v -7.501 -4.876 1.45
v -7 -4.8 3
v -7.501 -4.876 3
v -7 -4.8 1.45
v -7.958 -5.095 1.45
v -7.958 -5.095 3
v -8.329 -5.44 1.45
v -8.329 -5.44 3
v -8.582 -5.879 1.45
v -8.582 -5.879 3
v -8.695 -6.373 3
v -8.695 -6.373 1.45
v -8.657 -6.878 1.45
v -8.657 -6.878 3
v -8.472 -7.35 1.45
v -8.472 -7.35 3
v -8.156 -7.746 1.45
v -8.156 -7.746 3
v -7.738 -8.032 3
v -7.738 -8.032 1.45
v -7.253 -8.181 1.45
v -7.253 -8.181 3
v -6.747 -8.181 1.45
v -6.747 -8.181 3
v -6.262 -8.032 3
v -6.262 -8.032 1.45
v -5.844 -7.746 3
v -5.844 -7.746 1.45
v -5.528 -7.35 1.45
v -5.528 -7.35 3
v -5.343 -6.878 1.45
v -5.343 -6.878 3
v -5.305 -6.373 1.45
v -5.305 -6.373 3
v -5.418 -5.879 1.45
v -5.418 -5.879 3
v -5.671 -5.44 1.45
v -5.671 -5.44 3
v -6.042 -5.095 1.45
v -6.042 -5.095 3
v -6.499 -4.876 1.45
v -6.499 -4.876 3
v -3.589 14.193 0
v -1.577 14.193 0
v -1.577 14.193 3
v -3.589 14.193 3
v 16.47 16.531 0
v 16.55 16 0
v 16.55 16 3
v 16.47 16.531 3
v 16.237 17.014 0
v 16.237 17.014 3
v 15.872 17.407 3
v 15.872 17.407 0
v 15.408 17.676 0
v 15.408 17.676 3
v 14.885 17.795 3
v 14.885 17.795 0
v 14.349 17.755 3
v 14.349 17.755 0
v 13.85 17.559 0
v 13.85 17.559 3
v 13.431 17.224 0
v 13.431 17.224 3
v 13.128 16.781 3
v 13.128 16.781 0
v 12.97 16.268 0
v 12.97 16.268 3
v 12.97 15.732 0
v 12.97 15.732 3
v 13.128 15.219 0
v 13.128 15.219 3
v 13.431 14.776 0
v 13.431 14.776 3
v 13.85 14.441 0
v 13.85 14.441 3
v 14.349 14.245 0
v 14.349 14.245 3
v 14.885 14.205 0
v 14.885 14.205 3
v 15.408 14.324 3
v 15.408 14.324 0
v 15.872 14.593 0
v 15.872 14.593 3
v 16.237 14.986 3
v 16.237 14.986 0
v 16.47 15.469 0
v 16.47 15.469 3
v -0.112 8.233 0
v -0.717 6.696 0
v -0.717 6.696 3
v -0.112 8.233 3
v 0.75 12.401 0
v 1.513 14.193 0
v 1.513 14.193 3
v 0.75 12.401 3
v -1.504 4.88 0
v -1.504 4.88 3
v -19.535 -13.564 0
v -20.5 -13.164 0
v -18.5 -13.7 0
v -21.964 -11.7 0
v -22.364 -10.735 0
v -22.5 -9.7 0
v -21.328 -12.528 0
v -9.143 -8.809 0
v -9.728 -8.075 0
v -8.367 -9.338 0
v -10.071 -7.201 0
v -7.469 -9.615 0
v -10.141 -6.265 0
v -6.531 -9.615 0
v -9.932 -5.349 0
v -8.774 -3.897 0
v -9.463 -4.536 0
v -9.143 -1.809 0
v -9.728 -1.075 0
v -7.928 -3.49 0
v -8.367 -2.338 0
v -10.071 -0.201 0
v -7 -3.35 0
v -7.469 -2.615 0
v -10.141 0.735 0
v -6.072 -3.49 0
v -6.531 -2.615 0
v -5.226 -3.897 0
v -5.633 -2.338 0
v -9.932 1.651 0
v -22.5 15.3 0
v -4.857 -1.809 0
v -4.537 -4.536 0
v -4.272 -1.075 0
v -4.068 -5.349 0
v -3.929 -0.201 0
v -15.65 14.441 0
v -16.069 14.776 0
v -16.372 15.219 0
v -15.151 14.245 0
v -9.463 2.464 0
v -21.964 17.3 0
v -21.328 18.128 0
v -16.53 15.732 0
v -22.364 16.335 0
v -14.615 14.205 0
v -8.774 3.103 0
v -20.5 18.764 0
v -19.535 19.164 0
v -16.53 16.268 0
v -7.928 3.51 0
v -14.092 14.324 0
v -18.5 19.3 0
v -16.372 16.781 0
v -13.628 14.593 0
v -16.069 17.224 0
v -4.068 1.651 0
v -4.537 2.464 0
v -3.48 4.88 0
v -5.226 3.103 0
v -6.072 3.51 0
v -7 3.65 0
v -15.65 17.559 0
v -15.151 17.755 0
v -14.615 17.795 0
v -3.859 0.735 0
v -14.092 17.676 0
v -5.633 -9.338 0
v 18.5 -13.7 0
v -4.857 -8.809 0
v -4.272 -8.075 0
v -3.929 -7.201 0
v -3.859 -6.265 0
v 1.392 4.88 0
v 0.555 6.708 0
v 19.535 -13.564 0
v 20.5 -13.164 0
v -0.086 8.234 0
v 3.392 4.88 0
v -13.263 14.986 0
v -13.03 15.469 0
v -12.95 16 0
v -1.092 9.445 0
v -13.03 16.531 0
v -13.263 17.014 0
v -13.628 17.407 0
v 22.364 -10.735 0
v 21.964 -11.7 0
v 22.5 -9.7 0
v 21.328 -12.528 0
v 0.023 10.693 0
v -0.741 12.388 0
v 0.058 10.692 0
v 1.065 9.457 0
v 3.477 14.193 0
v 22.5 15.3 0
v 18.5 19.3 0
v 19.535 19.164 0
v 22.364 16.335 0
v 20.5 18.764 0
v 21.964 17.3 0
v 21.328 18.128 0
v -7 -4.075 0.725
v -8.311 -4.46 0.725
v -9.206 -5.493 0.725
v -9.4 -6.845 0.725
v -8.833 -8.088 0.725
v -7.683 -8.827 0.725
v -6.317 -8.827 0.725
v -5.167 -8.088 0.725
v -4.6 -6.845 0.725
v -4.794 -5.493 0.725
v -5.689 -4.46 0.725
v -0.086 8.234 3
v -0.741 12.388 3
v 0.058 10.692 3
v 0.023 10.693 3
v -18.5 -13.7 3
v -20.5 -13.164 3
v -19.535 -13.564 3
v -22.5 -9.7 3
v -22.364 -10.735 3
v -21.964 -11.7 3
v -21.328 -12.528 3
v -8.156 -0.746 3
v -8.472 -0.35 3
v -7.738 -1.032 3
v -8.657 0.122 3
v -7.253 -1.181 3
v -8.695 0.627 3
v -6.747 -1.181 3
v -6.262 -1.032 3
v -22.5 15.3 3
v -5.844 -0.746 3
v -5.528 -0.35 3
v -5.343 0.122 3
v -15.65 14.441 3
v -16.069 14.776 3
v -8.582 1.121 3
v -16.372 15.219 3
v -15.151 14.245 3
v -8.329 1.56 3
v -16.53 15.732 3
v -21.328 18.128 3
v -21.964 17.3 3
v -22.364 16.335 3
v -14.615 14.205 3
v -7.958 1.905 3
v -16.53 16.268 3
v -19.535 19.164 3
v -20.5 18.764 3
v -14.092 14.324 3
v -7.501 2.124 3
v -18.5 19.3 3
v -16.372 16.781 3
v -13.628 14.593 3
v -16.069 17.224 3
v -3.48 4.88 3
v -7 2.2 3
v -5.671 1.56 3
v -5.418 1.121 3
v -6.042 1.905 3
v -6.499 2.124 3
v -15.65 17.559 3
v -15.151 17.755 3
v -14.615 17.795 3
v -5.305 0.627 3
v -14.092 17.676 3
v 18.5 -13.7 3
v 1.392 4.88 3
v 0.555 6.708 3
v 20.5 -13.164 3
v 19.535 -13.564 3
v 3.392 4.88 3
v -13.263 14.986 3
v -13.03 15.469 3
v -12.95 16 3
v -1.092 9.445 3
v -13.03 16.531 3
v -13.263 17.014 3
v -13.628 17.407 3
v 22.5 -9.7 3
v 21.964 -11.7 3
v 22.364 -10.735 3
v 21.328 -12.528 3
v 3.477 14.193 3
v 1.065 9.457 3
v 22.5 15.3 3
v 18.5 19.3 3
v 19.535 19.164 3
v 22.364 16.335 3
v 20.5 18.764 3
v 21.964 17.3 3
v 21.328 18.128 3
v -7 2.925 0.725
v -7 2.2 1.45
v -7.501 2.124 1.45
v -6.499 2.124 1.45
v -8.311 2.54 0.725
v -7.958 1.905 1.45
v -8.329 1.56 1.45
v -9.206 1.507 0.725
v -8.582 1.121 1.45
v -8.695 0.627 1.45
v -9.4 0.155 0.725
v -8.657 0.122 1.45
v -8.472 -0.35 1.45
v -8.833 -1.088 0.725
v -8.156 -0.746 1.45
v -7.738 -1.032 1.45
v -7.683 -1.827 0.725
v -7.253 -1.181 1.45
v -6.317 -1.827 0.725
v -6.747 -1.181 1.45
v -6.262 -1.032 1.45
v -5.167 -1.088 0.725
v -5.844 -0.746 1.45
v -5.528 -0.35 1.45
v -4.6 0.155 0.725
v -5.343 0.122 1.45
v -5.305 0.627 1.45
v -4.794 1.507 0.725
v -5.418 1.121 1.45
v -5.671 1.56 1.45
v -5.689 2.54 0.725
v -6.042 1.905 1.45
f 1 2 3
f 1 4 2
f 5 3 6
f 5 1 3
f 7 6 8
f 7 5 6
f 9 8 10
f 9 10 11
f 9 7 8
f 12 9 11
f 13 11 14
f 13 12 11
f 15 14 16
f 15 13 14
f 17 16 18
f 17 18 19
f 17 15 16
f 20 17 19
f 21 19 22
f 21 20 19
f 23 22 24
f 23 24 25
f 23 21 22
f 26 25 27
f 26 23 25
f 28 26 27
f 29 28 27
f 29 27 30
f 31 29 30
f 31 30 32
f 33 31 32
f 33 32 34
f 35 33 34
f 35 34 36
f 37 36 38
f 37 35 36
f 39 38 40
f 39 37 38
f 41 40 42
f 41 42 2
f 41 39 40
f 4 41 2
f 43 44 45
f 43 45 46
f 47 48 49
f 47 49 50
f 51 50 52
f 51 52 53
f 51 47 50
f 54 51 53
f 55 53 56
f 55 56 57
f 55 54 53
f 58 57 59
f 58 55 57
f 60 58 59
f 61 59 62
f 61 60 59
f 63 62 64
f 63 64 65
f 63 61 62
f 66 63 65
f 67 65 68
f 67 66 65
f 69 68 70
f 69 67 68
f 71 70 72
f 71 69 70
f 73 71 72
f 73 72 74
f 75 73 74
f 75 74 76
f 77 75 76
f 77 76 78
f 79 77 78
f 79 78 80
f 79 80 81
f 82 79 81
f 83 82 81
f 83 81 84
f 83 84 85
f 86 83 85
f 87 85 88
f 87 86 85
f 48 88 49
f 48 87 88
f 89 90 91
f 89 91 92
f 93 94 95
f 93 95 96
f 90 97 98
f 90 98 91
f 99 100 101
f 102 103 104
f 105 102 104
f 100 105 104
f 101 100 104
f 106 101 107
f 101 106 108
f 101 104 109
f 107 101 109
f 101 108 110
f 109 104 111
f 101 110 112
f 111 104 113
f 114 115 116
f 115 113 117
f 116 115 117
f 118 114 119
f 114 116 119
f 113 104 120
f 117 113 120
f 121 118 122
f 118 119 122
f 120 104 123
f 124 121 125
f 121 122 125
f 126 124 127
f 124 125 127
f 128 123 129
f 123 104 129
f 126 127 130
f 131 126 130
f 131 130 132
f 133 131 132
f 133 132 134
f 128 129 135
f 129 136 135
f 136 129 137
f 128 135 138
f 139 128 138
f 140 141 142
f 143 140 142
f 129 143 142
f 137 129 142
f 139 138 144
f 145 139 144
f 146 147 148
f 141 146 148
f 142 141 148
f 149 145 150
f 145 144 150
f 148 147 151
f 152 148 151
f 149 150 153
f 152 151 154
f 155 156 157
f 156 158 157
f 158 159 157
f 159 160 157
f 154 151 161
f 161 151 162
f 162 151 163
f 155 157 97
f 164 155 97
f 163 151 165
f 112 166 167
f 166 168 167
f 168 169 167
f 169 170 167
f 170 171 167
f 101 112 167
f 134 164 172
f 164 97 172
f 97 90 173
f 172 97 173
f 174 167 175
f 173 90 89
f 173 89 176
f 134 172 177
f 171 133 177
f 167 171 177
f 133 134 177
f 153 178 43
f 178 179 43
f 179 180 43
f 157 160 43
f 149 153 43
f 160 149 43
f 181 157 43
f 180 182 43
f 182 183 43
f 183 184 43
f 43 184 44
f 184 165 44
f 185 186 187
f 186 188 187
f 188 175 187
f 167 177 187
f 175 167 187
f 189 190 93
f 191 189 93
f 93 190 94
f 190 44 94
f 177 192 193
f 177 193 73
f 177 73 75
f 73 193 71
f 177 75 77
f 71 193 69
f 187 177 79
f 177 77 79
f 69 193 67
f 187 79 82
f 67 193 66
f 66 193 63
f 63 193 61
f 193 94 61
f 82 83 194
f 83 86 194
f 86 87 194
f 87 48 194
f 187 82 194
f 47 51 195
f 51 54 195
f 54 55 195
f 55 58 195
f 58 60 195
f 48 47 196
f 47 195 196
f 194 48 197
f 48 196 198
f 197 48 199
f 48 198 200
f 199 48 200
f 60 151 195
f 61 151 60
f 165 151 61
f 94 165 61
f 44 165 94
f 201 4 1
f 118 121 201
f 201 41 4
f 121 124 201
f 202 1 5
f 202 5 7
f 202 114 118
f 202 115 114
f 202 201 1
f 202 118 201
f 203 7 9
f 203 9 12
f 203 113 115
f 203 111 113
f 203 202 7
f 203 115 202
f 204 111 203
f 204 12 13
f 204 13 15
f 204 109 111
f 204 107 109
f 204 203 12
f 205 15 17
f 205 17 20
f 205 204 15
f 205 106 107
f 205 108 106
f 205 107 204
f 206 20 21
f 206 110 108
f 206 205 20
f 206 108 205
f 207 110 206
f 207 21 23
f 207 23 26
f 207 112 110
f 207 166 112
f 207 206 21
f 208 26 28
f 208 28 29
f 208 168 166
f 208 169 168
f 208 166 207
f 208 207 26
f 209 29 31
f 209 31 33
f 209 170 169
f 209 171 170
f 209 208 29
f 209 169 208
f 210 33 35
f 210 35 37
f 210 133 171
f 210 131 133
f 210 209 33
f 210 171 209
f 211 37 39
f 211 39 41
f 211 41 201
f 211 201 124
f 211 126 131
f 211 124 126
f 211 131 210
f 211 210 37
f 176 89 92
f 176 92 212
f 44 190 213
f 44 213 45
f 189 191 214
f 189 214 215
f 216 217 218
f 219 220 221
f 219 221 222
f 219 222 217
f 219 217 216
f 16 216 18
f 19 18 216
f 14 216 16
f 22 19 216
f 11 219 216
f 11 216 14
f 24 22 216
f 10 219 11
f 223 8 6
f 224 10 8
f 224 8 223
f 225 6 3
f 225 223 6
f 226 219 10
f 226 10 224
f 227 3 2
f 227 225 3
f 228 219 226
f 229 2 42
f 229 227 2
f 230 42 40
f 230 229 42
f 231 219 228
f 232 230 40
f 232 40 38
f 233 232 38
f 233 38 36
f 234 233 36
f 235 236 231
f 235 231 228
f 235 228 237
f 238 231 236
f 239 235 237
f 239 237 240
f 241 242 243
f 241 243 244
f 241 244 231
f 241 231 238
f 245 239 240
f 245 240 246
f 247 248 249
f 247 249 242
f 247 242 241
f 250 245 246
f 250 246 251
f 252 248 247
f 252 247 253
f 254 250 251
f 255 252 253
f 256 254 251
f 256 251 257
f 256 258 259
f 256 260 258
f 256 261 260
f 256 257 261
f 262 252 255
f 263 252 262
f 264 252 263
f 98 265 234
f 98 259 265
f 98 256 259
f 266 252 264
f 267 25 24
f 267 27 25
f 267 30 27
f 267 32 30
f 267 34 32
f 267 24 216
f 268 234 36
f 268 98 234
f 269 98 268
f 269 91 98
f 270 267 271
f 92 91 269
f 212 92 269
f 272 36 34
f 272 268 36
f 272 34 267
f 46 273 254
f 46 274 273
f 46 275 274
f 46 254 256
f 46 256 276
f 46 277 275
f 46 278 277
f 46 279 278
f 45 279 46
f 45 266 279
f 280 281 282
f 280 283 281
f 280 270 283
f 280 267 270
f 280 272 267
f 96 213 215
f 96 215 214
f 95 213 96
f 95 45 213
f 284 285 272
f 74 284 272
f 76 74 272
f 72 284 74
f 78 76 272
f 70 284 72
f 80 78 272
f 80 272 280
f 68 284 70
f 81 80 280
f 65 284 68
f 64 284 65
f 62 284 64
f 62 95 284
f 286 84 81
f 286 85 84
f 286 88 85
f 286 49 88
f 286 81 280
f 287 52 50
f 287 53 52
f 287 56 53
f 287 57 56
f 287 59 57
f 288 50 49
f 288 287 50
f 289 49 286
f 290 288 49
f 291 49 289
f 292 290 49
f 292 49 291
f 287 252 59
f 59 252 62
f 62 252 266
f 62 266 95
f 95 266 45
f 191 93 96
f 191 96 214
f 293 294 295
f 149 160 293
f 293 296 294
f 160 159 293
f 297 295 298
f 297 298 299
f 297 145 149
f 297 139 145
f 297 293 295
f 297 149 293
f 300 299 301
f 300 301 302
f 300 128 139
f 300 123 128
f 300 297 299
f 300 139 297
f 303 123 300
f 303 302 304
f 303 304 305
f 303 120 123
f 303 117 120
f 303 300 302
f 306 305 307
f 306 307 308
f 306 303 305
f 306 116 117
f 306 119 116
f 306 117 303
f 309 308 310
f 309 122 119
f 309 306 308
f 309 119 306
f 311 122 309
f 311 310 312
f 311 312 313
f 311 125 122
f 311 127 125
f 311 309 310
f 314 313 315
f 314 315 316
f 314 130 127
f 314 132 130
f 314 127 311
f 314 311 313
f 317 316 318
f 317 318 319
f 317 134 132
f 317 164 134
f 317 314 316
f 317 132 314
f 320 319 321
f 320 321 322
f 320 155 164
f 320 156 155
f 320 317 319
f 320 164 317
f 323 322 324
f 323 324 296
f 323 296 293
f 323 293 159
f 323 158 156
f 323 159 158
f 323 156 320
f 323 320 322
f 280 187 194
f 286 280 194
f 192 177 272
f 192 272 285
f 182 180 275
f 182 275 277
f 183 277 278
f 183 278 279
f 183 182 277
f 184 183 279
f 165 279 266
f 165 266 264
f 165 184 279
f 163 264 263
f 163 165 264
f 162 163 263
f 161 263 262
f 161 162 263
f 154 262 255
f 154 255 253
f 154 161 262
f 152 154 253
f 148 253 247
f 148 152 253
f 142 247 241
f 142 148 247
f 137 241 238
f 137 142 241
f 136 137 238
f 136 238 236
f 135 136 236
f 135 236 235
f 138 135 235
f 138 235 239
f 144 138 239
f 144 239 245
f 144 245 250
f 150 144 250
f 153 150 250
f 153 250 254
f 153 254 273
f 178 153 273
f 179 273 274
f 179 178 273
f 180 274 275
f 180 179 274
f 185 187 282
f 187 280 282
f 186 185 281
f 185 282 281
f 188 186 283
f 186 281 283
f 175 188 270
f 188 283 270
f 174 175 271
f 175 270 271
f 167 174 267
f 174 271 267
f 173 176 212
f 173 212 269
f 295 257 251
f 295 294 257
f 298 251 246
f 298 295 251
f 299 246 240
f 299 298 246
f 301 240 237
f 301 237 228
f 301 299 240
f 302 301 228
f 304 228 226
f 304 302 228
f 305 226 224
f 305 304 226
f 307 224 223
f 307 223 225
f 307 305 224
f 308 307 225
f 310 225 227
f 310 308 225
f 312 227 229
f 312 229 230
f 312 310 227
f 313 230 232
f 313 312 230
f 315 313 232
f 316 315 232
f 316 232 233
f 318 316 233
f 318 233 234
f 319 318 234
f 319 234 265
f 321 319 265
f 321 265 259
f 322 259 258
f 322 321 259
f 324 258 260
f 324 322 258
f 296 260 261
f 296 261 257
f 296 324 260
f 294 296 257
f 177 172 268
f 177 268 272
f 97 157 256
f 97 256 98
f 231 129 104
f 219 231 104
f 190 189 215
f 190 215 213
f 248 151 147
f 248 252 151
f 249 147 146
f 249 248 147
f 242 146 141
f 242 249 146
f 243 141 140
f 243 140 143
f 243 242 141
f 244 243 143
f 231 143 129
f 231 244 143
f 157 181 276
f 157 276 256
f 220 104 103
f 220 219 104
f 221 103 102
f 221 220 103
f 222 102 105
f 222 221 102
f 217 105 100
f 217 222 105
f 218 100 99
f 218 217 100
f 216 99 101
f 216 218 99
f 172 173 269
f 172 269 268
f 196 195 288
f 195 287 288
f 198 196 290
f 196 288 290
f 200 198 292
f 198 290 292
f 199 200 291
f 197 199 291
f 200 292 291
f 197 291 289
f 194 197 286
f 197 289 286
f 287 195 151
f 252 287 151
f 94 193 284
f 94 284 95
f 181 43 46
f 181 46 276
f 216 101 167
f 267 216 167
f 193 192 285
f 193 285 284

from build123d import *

# Parameters (mm, degrees)
SKETCH1_R                                    = 1.8
BOSS_EXTRUDE1_DEPTH                          = 3
FILLET1_R                                    = 4
CSK_FOR_M3_COUNTERSUNK_FLAT_HEAD_SCR_2_COUNT = 2
CSK_FOR_M3_COUNTERSUNK_FLAT_HEAD_SCR_2_PITCH = 7


with BuildPart() as part:
    # Sketch1 → Boss-Extrude1 (new body)
    with BuildSketch(Plane.XY):
        Polygon((22.5, 19.3), (-22.5, 19.3), (-22.5, -9.7), (-22.5, -13.7), (22.5, -13.7), (22.5, -9.7), align=None)
        with Locations((14.75, 16)):
            Circle(SKETCH1_R, mode=Mode.SUBTRACT)
        with Locations((-14.75, 16)):
            Circle(SKETCH1_R, mode=Mode.SUBTRACT)
        with BuildLine():
            Line((-3.479994944, 4.879643035), (-1.504454613, 4.879643035))
            Line((-1.504454613, 4.879643035), (-0.716662457, 6.696078227))
            add(Edge.make_bspline(
                [(-0.716662457, 6.696078227), (-0.662988728, 6.823847603), (-0.558253832, 7.073167199), (-0.407159323, 7.448475347), (-0.260246479, 7.833509844), (-0.163053085, 8.096372908), (-0.1123781, 8.233425246)],
                knots=[0, 0, 0, 0, 0.000415753, 0.000811269, 0.001213674, 0.001652036, 0.001652036, 0.001652036, 0.001652036], degree=3))
            Line((-0.1123781, 8.233425246), (-0.086428732, 8.234214033))
            add(Edge.make_bspline(
                [(-0.086428732, 8.234214033), (0.016216114, 7.980645356), (0.223344012, 7.468966992), (0.443707362, 6.962847127), (0.554866869, 6.707541356)],
                knots=[0, 0, 0, 0, 0.000820631, 0.001655958, 0.001655958, 0.001655958, 0.001655958], degree=3))
            Line((0.554866869, 6.707541356), (1.392196546, 4.879643035))
            Line((1.392196546, 4.879643035), (3.391976635, 4.879643035))
            Line((3.391976635, 4.879643035), (1.064959804, 9.457455895))
            Line((1.064959804, 9.457455895), (3.476699187, 14.192976369))
            Line((3.476699187, 14.192976369), (1.513395339, 14.192976369))
            Line((1.513395339, 14.192976369), (0.749842942, 12.400503146))
            add(Edge.make_bspline(
                [(0.749842942, 12.400503146), (0.683388417, 12.247174796), (0.555592527, 11.952315518), (0.374121285, 11.520725487), (0.206338492, 11.105720206), (0.107367824, 10.829588001), (0.057944958, 10.691696187)],
                knots=[0, 0, 0, 0, 0.000501324, 0.000964075, 0.001404587, 0.001843989, 0.001843989, 0.001843989, 0.001843989], degree=3))
            Line((0.057944958, 10.691696187), (0.022650182, 10.692809062))
            add(Edge.make_bspline(
                [(0.022650182, 10.692809062), (-0.035080758, 10.828878889), (-0.150655612, 11.101284822), (-0.329423009, 11.514746078), (-0.526398165, 11.943735097), (-0.667307197, 12.235388249), (-0.740993098, 12.387903135)],
                knots=[0, 0, 0, 0, 0.000443432, 0.000887733, 0.001351306, 0.001859446, 0.001859446, 0.001859446, 0.001859446], degree=3))
            Line((-0.740993098, 12.387903135), (-1.577173889, 14.192976369))
            Line((-1.577173889, 14.192976369), (-3.589073858, 14.192976369))
            Line((-3.589073858, 14.192976369), (-1.092378716, 9.445344589))
            Line((-1.092378716, 9.445344589), (-3.479994944, 4.879643035))
        make_face(mode=Mode.SUBTRACT)
    extrude(amount=BOSS_EXTRUDE1_DEPTH)

    # Fillet1
    fillet1_edges = [part.edges().sort_by_distance(p)[0] for p in [
        (-22.5, 19.3, 1.5),
        (22.5, 19.3, 1.5),
        (22.5, -13.7, 1.5),
        (-22.5, -13.7, 1.5),
    ]]
    fillet(fillet1_edges, radius=FILLET1_R)

    # Sketch6 → CSK for M3 Countersunk Flat Head Screw1 (revolve, cut)
    with BuildSketch(Plane(origin=(-7, -6.5, 0), x_dir=(0, 1, 0), z_dir=(1, 0, 0))):
        Polygon((0, 0), (0, 3), (1.7, 3), (1.7, 1.45), (3.15, 0), align=None)
    csk_for_m3_countersunk_flat_head_screw1 = revolve(axis=Axis((-7, -6.5, -6.35), (0, 0, 1)), mode=Mode.SUBTRACT)

    # CSK for M3 Countersunk Flat Head Scr 2: CSK for M3 Countersunk Flat Head Screw1 ×2
    with Locations(*[(0, i * CSK_FOR_M3_COUNTERSUNK_FLAT_HEAD_SCR_2_PITCH, 0) for i in range(1, CSK_FOR_M3_COUNTERSUNK_FLAT_HEAD_SCR_2_COUNT)]):
        add(csk_for_m3_countersunk_flat_head_screw1, mode=Mode.SUBTRACT)


solid = part.part
